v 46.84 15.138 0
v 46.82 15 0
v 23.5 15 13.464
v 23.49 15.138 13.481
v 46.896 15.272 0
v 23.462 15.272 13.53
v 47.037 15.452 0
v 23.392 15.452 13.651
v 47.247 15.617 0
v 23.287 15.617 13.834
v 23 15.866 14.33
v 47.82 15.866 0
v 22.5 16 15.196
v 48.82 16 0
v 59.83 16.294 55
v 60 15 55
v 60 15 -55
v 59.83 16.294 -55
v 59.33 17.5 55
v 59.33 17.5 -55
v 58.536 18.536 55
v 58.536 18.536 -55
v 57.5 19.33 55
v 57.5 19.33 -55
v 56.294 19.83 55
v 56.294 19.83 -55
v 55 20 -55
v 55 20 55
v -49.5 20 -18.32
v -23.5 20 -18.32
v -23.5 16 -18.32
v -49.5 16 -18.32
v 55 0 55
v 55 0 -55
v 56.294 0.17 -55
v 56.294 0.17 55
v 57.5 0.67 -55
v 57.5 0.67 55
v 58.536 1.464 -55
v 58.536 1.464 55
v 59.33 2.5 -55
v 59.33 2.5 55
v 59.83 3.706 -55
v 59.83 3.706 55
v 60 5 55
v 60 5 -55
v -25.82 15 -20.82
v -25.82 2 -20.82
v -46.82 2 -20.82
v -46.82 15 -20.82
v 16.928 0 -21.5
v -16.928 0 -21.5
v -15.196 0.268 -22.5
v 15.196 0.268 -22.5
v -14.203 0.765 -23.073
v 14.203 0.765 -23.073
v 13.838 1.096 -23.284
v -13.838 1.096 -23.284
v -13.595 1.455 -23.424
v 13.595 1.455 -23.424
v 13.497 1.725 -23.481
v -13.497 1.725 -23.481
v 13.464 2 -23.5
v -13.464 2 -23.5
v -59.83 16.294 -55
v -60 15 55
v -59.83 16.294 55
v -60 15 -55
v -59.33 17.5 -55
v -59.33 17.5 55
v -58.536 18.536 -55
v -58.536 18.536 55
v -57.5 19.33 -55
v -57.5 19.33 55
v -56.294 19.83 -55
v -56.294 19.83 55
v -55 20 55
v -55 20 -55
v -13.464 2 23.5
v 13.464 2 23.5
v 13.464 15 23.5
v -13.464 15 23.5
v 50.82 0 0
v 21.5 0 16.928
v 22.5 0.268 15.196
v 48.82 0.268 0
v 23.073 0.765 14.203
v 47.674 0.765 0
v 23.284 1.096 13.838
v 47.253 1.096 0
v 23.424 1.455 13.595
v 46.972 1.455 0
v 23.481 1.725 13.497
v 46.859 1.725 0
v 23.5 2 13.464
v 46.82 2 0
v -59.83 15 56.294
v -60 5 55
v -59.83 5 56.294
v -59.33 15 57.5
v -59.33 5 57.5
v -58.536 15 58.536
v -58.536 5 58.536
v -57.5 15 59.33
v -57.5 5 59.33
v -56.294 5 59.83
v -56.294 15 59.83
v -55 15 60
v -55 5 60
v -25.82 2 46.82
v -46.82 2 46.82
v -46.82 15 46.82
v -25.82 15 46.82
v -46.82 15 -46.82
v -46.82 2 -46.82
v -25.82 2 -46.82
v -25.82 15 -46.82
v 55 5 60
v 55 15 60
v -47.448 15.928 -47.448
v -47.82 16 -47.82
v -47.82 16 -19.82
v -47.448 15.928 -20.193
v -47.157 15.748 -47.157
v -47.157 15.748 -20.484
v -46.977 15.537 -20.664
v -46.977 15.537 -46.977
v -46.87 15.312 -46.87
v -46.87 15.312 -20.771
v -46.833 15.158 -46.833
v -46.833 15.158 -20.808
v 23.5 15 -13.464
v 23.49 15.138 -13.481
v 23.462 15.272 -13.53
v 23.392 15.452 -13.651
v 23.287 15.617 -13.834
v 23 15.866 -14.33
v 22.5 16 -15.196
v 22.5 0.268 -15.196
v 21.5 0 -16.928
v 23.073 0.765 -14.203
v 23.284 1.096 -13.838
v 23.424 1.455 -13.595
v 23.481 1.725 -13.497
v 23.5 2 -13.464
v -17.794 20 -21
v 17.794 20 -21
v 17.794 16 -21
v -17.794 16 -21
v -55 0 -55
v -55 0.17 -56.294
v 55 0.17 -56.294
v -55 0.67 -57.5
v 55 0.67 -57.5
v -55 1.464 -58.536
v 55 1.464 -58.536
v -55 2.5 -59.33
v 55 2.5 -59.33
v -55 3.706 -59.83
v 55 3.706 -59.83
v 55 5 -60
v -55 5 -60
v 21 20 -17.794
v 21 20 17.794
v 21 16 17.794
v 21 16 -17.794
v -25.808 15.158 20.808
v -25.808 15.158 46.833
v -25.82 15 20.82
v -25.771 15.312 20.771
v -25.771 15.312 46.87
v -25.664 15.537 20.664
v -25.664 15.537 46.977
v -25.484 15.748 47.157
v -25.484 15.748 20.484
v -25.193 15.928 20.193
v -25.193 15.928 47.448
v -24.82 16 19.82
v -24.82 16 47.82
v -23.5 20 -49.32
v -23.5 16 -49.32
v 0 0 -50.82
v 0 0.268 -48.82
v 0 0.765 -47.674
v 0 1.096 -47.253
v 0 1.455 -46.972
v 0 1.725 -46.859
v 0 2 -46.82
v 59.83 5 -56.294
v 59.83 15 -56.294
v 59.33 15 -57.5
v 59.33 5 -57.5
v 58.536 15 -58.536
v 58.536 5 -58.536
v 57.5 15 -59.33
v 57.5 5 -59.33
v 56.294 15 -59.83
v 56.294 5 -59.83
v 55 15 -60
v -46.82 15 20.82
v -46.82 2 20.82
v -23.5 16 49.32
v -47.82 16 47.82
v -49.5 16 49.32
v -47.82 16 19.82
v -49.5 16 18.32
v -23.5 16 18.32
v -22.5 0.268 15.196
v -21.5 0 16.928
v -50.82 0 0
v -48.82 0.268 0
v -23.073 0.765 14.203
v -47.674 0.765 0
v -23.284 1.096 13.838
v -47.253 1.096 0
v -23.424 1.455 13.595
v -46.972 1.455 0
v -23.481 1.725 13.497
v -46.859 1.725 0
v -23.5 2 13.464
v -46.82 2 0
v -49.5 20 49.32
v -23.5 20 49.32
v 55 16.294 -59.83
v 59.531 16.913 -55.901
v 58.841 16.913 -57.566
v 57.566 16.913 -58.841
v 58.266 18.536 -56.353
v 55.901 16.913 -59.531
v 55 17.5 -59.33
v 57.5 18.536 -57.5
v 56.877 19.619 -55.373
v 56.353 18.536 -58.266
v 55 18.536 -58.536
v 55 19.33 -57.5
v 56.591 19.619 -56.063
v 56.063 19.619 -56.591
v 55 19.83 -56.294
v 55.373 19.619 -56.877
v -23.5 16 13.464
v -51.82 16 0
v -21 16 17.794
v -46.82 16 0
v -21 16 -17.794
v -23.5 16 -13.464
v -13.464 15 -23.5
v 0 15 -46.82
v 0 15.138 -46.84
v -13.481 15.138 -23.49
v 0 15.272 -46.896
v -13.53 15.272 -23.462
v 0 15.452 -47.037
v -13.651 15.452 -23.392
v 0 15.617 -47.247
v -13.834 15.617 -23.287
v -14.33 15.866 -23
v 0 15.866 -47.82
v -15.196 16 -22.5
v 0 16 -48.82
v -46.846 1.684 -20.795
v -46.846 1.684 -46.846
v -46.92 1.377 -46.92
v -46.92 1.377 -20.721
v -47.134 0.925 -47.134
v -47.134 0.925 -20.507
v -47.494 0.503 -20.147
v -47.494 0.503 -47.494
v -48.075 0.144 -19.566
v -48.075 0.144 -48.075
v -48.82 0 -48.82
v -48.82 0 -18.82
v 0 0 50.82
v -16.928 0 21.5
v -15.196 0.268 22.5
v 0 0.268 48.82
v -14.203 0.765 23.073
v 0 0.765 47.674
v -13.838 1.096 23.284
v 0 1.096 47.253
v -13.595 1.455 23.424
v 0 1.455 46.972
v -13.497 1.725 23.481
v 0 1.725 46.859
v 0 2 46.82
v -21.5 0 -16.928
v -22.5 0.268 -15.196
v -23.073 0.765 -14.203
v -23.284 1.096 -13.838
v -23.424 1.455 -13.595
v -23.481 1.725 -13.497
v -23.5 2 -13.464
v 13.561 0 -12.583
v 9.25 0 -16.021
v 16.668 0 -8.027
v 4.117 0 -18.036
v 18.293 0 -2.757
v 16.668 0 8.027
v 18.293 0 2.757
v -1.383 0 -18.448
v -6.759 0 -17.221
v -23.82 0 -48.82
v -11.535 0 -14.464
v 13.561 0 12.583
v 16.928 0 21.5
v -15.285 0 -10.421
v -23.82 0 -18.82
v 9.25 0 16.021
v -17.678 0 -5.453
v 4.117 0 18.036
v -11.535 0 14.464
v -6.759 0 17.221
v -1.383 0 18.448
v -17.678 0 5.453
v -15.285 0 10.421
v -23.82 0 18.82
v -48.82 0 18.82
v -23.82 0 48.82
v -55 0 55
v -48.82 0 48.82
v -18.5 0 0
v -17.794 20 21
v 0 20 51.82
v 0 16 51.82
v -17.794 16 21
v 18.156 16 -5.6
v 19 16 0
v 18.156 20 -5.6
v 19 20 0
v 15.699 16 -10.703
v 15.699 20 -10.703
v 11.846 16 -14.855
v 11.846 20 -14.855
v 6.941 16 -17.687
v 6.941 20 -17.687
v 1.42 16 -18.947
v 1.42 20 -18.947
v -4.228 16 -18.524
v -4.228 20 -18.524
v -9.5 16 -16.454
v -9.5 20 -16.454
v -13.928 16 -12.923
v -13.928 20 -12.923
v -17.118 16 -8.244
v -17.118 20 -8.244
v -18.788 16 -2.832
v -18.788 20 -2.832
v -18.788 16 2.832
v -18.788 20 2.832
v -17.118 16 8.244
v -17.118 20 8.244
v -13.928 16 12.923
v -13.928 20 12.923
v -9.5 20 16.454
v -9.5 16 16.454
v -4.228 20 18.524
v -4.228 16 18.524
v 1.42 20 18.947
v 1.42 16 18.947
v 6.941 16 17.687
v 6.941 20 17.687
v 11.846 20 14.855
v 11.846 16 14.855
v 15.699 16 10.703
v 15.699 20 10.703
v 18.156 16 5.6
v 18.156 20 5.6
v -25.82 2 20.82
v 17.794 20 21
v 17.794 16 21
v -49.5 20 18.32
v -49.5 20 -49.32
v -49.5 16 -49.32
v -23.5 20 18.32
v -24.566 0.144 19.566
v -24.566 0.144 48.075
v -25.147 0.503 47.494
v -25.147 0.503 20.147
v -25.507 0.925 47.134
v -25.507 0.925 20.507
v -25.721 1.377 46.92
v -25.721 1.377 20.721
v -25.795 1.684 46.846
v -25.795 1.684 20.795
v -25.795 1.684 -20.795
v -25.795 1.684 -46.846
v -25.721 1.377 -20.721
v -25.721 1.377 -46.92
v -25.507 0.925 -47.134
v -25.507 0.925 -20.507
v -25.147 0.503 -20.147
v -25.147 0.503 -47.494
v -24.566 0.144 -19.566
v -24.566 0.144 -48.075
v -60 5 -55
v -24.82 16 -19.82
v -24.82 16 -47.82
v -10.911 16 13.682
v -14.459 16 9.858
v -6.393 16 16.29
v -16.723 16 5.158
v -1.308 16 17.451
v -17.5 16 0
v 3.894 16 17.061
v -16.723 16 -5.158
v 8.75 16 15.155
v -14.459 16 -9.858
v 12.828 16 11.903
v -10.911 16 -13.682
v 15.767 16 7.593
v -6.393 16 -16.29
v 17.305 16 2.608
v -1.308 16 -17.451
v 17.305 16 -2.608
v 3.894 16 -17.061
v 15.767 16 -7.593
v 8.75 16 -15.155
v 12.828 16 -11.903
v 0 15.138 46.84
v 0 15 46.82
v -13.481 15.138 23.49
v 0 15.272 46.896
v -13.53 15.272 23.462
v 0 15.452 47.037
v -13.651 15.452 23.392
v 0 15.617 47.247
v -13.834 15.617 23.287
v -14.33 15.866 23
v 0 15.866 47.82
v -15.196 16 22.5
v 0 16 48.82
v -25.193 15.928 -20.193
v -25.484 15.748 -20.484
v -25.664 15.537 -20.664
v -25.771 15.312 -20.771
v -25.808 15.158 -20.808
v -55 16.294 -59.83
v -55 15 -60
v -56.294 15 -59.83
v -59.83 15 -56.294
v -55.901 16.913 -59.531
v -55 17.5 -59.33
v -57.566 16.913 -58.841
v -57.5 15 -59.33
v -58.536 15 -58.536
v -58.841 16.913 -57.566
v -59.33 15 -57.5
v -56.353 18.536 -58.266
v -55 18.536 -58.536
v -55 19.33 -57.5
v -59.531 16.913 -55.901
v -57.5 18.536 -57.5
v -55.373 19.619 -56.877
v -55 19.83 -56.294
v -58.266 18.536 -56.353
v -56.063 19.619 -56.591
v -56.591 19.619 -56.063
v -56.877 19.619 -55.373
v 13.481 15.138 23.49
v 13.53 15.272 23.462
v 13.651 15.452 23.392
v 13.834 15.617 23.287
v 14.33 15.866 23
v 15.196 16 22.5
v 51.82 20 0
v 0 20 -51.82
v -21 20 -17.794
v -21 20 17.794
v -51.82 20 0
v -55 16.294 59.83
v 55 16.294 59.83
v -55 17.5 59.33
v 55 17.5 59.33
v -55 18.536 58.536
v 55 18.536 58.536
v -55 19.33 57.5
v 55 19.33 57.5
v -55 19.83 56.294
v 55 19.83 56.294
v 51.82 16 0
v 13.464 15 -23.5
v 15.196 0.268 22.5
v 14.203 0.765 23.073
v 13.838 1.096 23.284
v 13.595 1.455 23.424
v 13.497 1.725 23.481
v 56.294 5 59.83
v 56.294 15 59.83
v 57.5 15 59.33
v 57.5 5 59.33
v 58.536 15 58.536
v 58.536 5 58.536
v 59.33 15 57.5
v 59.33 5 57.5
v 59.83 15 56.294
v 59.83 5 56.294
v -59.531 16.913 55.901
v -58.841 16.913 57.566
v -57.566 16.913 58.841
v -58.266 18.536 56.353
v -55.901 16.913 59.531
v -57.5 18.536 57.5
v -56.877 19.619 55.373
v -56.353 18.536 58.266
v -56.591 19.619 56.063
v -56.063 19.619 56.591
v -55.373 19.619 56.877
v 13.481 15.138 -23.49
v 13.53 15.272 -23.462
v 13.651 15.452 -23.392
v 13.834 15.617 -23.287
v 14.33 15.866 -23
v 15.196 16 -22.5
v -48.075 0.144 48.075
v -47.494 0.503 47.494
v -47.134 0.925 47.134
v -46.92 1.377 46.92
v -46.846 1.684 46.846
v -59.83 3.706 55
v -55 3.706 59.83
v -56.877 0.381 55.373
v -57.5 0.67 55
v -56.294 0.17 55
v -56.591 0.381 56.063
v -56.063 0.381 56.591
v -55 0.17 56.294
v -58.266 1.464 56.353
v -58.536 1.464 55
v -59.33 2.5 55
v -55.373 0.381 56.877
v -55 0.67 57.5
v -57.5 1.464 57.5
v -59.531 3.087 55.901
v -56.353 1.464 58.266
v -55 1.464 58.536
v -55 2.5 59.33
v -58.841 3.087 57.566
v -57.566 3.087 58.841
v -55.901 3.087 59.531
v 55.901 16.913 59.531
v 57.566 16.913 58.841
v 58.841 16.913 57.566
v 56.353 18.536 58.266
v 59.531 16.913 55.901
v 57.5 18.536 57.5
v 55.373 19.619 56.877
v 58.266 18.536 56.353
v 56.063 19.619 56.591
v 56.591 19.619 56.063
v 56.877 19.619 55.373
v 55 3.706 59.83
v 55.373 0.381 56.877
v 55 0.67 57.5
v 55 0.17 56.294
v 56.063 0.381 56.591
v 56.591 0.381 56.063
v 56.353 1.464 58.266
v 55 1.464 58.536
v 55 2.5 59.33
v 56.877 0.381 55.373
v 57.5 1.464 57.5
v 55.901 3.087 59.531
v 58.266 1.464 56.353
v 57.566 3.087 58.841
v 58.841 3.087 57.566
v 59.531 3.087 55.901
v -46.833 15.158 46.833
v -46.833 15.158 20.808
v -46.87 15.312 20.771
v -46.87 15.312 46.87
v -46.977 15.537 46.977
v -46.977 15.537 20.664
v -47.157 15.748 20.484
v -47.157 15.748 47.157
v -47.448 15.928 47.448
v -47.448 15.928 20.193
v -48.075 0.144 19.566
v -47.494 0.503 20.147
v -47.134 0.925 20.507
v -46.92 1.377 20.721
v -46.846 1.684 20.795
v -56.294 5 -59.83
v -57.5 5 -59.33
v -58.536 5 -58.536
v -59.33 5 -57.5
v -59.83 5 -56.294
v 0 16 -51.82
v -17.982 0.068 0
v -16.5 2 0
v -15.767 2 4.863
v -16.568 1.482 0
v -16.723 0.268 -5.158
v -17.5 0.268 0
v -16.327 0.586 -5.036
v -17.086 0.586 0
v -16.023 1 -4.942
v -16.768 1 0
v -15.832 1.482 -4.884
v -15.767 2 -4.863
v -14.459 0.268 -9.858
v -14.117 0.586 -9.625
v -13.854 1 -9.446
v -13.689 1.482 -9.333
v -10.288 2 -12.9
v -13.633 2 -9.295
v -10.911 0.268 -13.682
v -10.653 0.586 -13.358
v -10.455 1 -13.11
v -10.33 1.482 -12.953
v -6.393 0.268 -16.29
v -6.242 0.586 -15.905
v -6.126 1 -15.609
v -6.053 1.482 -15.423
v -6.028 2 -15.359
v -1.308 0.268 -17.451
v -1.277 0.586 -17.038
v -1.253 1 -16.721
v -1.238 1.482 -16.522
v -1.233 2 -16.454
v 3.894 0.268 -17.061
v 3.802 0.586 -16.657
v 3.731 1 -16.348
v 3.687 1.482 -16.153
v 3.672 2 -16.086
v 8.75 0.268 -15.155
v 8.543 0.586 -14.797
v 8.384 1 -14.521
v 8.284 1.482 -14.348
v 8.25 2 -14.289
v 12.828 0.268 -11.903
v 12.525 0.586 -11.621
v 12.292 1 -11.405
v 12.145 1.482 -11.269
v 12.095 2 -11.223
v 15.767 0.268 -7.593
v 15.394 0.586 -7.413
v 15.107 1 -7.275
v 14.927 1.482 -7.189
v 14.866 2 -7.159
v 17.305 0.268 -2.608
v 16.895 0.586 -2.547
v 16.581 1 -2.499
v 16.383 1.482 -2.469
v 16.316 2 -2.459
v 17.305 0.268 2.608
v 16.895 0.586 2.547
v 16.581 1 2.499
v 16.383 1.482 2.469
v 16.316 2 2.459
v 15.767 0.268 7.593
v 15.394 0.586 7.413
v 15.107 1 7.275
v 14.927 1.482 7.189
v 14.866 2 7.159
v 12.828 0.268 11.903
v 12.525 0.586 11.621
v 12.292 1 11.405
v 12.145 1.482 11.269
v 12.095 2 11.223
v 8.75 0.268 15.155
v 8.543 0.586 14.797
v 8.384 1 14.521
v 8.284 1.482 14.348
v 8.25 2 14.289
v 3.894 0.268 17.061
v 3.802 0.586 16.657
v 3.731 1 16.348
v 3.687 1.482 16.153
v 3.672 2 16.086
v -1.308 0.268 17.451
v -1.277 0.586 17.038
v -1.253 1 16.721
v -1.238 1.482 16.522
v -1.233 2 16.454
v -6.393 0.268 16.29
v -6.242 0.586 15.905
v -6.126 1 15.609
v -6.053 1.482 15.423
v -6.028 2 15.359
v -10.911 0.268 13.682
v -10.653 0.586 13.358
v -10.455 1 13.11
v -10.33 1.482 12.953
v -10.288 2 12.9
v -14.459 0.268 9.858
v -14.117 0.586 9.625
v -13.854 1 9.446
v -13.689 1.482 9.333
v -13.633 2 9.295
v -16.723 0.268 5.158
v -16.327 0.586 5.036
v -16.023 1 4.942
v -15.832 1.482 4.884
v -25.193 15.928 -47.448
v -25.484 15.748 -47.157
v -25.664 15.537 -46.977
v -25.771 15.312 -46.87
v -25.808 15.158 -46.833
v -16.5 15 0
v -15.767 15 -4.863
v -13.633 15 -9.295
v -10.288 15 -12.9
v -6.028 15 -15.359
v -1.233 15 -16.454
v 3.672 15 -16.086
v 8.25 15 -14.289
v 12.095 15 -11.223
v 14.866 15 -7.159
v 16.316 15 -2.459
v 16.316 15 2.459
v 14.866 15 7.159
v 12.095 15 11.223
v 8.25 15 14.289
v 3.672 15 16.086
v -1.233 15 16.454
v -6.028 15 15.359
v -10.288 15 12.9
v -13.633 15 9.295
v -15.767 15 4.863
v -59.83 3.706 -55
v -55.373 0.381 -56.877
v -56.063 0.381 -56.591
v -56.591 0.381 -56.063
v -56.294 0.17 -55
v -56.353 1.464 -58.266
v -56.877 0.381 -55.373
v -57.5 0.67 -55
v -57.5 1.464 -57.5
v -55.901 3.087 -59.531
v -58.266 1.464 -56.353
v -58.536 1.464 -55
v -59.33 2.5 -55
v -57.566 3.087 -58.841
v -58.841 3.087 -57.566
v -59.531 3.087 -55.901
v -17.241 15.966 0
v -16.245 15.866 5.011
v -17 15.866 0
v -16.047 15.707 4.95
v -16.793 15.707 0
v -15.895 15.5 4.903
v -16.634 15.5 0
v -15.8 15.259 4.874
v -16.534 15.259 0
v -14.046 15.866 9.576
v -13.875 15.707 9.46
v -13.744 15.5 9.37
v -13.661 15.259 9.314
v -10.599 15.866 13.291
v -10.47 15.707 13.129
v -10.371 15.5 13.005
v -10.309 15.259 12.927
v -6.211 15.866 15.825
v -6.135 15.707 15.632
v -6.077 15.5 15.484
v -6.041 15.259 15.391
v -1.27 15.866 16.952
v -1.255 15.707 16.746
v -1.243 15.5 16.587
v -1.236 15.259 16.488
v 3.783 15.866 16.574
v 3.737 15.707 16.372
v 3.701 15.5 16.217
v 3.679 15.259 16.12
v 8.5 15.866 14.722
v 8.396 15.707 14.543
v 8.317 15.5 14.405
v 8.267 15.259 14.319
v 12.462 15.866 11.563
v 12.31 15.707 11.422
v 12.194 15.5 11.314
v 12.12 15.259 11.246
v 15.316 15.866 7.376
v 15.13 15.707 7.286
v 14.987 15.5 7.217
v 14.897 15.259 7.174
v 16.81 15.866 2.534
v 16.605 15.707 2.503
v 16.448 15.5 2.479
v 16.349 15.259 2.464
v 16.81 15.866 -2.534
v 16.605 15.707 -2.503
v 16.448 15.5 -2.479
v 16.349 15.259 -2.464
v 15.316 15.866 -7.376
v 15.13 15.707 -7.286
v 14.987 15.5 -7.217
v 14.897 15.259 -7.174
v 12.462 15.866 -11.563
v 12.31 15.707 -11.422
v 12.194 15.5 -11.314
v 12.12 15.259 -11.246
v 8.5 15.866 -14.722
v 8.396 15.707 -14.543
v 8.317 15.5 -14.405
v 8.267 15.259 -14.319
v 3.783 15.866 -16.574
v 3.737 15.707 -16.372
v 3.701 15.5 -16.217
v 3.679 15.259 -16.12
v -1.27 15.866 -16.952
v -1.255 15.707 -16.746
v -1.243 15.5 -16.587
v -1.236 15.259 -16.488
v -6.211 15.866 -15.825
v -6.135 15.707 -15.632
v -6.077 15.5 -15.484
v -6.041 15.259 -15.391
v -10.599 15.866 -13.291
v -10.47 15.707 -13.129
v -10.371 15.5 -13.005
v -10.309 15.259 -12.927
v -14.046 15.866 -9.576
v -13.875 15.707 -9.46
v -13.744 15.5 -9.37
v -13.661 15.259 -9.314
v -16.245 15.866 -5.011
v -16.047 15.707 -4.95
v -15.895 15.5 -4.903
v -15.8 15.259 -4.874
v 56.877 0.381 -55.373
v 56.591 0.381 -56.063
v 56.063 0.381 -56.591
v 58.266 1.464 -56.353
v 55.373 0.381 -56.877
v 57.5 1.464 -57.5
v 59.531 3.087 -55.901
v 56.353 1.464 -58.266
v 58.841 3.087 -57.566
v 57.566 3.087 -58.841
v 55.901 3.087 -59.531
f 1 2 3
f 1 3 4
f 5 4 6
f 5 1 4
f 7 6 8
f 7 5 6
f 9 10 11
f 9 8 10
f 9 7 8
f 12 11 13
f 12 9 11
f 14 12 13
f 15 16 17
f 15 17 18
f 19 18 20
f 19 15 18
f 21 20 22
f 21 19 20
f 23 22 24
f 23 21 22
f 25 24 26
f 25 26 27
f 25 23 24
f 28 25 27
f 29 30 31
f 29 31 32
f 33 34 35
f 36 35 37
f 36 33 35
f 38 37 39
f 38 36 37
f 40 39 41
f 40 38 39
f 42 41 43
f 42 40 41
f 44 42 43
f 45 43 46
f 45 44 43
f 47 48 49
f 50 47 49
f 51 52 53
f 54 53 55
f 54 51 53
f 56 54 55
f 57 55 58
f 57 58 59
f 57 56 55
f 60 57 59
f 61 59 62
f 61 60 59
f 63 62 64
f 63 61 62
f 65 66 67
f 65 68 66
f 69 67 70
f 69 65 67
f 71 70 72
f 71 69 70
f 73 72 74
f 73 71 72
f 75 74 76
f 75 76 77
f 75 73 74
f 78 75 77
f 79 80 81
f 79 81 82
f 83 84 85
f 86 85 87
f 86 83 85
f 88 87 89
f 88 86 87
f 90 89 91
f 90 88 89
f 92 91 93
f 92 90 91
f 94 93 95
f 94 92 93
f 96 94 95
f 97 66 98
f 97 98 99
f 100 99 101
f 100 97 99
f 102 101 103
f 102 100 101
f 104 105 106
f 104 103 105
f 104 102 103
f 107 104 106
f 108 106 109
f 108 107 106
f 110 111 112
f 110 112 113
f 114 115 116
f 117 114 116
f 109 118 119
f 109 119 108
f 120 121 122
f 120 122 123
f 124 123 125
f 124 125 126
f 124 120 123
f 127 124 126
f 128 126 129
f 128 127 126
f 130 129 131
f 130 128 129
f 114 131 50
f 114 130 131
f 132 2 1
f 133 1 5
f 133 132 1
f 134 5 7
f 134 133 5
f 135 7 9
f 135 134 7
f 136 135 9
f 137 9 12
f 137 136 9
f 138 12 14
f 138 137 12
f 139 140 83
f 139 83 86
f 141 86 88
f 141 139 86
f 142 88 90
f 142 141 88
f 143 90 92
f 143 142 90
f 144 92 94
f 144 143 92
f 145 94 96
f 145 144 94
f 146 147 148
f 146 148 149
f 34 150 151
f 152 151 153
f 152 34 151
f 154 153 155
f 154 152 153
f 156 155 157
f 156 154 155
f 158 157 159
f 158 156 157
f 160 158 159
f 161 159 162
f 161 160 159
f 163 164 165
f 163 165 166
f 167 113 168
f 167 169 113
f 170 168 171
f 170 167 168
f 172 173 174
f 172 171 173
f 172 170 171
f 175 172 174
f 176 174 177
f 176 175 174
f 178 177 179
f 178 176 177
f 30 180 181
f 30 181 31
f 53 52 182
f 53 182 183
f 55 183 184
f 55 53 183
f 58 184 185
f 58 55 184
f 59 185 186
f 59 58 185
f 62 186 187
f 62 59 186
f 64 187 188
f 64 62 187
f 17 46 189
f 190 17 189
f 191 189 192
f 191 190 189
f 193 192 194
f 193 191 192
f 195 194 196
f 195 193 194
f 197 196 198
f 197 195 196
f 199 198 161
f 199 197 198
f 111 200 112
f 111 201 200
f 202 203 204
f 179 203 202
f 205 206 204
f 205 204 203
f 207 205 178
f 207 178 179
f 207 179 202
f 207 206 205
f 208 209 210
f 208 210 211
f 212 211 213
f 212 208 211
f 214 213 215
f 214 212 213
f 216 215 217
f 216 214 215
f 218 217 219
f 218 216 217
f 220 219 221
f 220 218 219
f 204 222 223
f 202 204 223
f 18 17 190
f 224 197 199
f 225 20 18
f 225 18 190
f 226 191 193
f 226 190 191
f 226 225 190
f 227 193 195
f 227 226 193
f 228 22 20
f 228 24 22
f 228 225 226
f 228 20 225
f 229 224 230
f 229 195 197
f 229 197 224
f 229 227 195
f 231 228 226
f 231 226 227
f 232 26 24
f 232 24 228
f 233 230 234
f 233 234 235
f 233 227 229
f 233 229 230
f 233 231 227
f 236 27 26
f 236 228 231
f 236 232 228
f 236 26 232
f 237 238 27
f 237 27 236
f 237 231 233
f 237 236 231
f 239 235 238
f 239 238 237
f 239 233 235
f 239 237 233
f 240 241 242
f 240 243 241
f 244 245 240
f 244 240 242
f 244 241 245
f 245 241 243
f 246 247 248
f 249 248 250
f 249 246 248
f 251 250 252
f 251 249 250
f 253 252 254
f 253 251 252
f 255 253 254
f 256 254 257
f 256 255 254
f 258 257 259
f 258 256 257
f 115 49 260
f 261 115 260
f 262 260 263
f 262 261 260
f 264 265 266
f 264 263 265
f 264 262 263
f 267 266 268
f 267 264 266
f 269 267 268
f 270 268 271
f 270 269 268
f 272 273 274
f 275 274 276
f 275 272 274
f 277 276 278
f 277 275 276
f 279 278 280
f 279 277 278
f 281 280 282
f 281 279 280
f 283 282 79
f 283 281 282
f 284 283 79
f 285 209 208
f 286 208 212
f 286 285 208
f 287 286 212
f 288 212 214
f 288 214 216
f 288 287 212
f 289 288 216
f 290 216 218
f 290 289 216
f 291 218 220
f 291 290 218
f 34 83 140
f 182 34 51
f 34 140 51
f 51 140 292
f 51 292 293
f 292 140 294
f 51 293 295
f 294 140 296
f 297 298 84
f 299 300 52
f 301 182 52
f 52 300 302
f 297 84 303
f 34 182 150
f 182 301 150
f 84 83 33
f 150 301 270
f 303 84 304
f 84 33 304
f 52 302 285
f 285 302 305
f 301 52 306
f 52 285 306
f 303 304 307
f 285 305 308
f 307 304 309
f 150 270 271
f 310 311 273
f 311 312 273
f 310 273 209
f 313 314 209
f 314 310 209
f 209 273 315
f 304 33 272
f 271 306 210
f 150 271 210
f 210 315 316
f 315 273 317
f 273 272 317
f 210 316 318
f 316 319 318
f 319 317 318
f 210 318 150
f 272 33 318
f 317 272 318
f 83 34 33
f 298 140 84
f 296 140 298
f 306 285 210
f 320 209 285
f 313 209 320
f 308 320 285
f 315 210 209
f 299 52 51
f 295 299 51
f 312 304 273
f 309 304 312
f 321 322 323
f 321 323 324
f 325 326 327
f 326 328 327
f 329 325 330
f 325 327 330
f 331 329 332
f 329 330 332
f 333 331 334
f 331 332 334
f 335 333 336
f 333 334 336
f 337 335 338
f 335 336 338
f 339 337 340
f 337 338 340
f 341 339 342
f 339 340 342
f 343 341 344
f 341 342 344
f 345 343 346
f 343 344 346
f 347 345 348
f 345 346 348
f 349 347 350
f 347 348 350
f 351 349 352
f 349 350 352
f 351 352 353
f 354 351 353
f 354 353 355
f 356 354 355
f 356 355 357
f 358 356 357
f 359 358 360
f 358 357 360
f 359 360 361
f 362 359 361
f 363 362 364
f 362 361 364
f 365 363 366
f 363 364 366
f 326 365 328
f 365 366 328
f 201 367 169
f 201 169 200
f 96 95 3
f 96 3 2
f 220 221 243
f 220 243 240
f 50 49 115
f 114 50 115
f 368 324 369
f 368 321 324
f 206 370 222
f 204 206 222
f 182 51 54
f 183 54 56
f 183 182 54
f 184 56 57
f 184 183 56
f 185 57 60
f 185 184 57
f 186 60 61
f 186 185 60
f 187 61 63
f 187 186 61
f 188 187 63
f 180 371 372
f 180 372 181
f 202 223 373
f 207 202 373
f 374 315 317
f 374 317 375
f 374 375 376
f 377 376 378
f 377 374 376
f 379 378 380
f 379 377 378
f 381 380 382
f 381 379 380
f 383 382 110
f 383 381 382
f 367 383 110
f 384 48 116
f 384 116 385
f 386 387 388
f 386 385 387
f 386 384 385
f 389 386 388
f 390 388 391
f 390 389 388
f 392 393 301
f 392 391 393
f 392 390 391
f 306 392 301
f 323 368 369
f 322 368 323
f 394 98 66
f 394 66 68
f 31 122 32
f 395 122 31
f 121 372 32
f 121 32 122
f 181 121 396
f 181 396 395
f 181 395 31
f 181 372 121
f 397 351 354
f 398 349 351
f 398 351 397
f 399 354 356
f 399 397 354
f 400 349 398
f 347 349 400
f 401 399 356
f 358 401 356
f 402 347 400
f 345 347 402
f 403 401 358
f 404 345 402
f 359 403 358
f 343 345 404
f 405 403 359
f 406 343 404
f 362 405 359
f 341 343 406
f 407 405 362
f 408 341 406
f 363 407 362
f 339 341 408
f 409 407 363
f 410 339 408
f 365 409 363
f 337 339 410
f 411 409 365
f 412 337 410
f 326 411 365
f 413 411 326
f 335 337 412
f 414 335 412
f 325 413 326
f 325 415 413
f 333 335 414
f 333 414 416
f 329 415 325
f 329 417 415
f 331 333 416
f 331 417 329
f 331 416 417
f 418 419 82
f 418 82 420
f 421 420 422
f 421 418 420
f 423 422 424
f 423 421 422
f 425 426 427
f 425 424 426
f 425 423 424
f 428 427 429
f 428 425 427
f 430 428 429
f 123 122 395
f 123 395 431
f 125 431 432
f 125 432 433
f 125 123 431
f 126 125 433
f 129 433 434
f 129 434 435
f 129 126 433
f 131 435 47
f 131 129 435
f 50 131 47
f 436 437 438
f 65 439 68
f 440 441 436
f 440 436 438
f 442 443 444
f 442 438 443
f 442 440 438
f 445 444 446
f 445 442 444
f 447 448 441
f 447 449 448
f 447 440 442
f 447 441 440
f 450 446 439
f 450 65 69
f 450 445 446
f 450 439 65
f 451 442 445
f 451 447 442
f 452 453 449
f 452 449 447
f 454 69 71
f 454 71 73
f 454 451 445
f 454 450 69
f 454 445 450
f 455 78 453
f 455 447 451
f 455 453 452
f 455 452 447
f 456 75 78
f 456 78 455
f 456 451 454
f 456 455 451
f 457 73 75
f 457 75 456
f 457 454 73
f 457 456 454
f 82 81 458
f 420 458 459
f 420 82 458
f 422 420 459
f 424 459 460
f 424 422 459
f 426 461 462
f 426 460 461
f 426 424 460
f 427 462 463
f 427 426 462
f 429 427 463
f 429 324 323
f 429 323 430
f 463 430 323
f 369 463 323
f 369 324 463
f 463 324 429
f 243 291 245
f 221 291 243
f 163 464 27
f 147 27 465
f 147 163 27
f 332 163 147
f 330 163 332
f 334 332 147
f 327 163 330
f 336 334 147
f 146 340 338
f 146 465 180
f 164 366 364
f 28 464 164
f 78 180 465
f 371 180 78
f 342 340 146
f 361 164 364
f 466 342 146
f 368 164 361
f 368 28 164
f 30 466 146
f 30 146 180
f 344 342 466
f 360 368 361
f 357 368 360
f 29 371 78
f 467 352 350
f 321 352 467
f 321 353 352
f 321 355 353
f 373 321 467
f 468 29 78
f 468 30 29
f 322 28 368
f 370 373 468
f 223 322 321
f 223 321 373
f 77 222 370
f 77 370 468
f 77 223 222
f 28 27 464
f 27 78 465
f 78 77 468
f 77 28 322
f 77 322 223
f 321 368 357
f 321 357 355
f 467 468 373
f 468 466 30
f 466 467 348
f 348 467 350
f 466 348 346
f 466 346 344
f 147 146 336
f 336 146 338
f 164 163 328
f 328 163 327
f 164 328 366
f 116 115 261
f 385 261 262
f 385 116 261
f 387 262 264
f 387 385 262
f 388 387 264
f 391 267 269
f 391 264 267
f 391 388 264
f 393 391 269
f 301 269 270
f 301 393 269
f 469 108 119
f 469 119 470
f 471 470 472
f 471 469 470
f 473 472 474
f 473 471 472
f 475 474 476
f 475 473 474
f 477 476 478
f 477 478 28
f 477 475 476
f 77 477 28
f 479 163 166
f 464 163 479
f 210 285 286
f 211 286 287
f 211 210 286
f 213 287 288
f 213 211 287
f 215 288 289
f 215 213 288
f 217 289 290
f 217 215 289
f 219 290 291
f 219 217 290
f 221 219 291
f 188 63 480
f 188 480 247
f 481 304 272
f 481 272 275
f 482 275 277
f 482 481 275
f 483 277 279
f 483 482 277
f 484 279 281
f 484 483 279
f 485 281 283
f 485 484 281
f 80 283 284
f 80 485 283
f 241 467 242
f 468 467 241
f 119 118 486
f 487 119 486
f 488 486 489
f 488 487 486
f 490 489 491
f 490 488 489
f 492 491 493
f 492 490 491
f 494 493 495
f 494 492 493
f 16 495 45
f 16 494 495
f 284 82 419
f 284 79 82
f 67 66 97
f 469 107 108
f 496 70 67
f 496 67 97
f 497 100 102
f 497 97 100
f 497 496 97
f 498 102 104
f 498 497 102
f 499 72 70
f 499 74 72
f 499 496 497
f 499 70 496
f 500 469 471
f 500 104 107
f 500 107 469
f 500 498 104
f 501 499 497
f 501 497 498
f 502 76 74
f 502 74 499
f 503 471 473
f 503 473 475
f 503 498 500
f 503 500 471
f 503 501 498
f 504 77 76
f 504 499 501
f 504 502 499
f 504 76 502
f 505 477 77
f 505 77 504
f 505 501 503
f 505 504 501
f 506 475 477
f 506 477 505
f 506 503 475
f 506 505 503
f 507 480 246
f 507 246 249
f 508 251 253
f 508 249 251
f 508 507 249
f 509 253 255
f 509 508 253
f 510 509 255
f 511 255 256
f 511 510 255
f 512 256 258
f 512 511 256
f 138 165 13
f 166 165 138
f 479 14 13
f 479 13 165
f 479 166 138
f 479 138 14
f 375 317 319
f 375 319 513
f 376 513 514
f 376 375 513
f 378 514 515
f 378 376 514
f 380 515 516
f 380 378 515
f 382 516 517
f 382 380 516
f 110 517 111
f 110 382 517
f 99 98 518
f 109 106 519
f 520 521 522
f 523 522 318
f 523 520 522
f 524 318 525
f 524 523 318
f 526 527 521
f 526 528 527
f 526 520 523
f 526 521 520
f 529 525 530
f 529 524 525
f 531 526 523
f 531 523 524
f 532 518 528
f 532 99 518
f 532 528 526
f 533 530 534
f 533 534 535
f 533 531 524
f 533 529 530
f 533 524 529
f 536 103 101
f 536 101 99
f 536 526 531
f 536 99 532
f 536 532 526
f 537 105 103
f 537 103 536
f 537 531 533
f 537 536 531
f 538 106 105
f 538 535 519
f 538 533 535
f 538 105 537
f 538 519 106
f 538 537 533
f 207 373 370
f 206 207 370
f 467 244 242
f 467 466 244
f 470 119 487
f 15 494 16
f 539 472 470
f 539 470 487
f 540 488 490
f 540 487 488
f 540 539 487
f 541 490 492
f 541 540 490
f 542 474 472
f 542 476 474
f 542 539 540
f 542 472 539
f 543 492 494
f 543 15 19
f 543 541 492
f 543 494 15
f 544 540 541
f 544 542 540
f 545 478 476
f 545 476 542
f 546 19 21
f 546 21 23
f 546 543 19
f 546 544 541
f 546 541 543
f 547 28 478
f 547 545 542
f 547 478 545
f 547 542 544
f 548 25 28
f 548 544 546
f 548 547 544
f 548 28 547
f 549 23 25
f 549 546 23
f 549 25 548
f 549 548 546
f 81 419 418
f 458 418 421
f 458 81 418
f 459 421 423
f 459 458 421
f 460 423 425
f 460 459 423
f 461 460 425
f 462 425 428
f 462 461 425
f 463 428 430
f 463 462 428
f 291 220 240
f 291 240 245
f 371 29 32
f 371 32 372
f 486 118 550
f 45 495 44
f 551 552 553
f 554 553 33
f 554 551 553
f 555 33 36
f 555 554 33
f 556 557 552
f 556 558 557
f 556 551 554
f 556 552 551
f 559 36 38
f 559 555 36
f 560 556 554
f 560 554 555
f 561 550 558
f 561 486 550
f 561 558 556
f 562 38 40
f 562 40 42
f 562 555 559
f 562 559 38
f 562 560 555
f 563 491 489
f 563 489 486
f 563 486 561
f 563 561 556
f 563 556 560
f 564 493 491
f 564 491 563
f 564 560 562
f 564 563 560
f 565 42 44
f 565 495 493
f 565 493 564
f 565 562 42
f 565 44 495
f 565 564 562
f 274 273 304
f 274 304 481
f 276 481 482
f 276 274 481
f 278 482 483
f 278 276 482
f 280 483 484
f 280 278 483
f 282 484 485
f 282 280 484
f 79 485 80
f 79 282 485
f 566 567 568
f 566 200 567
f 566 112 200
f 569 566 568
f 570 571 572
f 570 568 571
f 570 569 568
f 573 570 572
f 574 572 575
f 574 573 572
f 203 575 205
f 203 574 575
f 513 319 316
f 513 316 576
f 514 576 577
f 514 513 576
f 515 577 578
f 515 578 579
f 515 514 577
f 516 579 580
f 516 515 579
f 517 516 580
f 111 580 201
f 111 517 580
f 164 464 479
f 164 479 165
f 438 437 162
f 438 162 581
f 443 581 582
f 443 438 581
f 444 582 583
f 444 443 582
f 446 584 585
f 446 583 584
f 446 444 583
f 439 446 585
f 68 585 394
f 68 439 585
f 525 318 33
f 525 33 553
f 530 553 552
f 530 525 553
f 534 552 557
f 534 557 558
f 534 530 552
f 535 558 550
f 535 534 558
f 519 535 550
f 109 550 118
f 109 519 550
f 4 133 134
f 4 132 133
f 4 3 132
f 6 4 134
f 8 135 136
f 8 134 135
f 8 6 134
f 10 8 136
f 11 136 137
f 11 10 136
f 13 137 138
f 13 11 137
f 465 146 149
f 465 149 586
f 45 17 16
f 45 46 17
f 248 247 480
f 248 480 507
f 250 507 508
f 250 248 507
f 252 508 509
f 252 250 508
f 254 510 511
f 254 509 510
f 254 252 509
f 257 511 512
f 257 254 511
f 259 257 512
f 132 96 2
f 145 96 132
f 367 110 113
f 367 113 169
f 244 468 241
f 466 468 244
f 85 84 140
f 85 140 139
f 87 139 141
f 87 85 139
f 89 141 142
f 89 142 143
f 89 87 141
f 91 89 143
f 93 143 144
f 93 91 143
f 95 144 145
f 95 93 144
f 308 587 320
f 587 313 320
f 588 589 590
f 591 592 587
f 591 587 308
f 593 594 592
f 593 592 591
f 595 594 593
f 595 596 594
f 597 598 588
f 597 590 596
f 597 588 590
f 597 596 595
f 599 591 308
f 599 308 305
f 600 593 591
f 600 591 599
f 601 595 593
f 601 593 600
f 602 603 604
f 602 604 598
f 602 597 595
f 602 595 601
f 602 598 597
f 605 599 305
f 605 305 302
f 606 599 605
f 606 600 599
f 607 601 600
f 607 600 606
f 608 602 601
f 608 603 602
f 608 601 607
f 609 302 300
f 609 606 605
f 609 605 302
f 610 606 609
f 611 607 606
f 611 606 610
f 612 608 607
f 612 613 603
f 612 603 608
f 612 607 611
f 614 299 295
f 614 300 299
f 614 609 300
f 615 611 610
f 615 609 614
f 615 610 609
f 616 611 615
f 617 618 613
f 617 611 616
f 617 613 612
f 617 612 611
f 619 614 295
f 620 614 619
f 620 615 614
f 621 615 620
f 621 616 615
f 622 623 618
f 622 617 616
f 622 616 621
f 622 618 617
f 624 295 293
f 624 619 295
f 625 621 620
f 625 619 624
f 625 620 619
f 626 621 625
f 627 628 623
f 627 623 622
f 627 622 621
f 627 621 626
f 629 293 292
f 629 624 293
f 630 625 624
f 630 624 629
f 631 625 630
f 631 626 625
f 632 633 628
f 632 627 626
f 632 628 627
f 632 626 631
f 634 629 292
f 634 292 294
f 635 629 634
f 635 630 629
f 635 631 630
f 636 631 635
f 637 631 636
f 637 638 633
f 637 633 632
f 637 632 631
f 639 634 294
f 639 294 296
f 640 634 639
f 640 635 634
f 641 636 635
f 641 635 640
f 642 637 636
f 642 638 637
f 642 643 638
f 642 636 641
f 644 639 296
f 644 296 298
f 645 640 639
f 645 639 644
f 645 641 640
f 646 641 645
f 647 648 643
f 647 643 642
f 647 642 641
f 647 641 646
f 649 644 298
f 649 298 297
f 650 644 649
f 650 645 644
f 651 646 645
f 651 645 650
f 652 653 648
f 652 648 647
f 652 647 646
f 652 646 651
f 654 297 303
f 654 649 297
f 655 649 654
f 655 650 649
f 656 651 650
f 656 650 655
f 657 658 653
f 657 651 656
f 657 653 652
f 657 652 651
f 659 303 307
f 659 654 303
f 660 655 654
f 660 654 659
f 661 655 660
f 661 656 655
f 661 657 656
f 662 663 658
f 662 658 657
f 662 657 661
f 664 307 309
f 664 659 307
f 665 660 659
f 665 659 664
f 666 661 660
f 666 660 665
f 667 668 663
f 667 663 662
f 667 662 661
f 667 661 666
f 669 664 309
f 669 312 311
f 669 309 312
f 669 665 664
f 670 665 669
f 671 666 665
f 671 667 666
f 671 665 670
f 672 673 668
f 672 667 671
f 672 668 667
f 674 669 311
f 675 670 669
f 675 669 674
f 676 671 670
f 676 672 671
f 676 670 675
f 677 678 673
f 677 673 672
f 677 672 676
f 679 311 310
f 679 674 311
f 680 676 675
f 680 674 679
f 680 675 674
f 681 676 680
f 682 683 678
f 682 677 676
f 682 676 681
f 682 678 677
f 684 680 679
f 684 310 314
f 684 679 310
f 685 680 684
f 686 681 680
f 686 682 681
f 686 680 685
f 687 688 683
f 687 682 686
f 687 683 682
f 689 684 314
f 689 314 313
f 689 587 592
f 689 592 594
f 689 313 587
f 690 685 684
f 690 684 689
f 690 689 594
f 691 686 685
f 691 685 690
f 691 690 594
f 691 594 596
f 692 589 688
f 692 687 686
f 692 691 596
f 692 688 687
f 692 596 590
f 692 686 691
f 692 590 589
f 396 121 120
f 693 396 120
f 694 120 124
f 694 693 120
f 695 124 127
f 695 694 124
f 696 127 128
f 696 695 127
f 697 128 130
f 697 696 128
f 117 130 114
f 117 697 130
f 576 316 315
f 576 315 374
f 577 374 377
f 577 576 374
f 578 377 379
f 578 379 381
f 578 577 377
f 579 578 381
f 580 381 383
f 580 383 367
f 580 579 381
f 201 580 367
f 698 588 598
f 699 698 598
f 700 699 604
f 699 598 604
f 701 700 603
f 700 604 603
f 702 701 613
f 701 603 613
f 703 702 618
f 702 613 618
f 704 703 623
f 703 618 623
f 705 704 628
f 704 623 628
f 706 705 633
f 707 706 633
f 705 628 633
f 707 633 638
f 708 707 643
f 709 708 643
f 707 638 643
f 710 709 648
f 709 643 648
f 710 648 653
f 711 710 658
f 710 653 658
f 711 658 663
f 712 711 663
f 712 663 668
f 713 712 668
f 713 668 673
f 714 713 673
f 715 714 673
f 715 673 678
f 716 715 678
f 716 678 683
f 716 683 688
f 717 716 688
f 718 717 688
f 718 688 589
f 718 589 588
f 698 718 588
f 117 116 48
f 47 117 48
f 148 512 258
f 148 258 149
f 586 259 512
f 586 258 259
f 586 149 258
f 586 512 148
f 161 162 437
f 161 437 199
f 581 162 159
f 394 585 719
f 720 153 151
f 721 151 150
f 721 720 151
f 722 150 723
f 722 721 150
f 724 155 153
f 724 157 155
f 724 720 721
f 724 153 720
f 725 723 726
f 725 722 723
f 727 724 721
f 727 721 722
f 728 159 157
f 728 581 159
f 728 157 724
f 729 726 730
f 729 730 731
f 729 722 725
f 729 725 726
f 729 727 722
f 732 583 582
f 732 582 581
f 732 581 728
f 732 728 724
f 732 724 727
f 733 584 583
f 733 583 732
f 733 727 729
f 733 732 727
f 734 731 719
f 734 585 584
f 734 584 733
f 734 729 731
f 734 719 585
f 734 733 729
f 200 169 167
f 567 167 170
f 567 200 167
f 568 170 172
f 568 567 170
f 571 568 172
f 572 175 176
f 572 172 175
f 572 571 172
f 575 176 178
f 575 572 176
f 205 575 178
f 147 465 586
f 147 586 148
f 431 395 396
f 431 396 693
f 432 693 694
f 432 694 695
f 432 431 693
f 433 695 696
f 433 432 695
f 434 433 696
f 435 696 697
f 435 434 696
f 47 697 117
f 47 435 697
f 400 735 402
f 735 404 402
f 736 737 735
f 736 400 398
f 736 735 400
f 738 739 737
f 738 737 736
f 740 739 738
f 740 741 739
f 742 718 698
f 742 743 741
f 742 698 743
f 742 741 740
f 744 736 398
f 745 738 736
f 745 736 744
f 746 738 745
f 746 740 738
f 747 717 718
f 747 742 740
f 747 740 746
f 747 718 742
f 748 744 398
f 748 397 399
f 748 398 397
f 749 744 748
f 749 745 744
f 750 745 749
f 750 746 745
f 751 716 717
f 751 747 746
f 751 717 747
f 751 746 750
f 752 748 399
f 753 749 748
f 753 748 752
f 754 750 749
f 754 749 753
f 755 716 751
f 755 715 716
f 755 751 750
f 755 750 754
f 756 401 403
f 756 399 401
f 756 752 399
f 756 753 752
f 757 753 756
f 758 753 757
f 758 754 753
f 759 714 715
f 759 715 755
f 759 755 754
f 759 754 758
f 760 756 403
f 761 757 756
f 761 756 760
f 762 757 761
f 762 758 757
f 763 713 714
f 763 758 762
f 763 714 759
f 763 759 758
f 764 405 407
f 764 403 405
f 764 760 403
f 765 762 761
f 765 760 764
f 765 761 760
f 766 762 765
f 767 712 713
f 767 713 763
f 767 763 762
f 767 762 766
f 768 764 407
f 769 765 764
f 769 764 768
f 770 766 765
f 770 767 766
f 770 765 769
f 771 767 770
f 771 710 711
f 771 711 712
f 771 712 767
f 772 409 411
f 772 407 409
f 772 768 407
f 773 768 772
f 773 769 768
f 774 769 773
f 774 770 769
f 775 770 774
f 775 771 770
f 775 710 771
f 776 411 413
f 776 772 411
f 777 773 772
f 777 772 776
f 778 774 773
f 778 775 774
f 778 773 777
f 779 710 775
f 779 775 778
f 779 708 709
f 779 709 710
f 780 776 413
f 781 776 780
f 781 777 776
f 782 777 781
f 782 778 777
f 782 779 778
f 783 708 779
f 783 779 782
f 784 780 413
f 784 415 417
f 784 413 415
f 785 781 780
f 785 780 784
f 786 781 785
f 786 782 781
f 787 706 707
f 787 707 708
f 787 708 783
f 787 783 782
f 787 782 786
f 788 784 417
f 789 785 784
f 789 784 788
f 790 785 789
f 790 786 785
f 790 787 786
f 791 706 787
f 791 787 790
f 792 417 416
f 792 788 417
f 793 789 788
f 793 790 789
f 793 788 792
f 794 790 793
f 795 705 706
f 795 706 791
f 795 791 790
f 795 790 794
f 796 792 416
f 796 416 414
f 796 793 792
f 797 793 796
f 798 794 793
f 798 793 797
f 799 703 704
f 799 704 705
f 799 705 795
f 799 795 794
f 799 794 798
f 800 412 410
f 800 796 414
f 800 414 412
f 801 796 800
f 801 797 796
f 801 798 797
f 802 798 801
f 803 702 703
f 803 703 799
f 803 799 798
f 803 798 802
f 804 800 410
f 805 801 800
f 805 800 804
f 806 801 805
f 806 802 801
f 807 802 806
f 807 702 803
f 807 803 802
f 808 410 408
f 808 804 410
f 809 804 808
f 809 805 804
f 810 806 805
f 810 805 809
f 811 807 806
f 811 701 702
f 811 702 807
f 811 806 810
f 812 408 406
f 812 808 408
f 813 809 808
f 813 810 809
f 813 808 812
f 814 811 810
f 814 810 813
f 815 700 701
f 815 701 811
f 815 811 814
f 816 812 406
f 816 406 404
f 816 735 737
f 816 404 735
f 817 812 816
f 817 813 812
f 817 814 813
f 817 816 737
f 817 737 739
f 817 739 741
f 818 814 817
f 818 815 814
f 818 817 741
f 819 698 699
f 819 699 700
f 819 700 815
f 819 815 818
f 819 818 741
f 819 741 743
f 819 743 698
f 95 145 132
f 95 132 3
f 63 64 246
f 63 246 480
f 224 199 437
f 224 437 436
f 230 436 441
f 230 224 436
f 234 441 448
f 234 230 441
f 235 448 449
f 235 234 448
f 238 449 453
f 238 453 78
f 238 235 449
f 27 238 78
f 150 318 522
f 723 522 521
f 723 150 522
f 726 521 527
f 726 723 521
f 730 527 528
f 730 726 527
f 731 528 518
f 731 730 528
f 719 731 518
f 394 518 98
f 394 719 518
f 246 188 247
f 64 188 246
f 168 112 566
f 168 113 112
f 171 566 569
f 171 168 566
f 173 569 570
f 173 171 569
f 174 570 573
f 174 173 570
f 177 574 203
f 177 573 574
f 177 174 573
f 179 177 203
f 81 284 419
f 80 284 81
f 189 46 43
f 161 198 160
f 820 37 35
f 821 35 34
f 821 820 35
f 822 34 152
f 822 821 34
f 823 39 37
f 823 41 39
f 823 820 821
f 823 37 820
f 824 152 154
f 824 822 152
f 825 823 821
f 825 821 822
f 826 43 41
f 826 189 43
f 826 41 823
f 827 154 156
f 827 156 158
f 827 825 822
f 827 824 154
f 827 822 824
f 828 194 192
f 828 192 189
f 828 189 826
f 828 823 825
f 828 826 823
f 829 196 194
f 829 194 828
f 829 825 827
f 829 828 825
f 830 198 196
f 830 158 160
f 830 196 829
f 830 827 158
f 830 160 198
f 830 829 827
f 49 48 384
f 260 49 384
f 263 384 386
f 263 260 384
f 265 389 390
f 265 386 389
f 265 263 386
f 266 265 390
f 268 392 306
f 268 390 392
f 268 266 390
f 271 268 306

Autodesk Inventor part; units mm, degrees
ref_plane "YZ Plane" through (0, 0, 0) normal (1, 0, 0) x (0, 1, 0)
ref_plane "XZ Plane" through (0, 0, 0) normal (0, 1, 0) x (-1, 0, 0)
ref_plane "XY Plane" through (0, 0, 0) normal (0, 0, 1) x (1, 0, 0)
sketch "Sketch1" plane through (0, 0, 0) normal (0, 1, 0) x (-1, 0, 0)
  circle A0 centre (0, 0) radius 15
  line L0 (0, -25) -> (10.866, -25)
  line L1 (0, -25) -> (-10.866, -25)
  line L2 (-10.866, -25) -> (0, -43.8205)
  line L3 (0, -43.8205) -> (10.866, -25)
  circle A1 centre (0, 0) radius 16.5
  line L4 (13.4641, -23.5) -> (0, -23.5)
  line L5 (0, -23.5) -> (-13.4641, -23.5)
  line L6 (-13.4641, -23.5) -> (0, -46.8205)
  line L7 (0, -46.8205) -> (13.4641, -23.5)
  line L8 (25, 0) -> (25, 10.866)
  line L9 (25, 0) -> (25, -10.866)
  line L10 (25, -10.866) -> (43.8205, 0)
  line L11 (43.8205, 0) -> (25, 10.866)
  line L12 (23.5, 13.4641) -> (23.5, 0)
  line L13 (23.5, 0) -> (23.5, -13.4641)
  line L14 (23.5, -13.4641) -> (46.8205, 0)
  line L15 (46.8205, 0) -> (23.5, 13.4641)
  line L16 (0, 25) -> (-10.866, 25)
  line L17 (0, 25) -> (10.866, 25)
  line L18 (10.866, 25) -> (0, 43.8205)
  line L19 (0, 43.8205) -> (-10.866, 25)
  line L20 (-13.4641, 23.5) -> (0, 23.5)
  line L21 (0, 23.5) -> (13.4641, 23.5)
  line L22 (13.4641, 23.5) -> (0, 46.8205)
  line L23 (0, 46.8205) -> (-13.4641, 23.5)
  line L24 (-25, 0) -> (-25, -10.866)
  line L25 (-25, 0) -> (-25, 10.866)
  line L26 (-25, 10.866) -> (-43.8205, 0)
  line L27 (-43.8205, 0) -> (-25, -10.866)
  line L28 (-23.5, -13.4641) -> (-23.5, 0)
  line L29 (-23.5, 0) -> (-23.5, 13.4641)
  line L30 (-23.5, 13.4641) -> (-46.8205, 0)
  line L31 (-46.8205, 0) -> (-23.5, -13.4641)
  line L32 (46.8205, 46.8205) -> (25.8205, 46.8205)
  line L33 (25.8205, 46.8205) -> (25.8205, 20.8205)
  line L34 (25.8205, 20.8205) -> (46.8205, 20.8205)
  line L35 (46.8205, 20.8205) -> (46.8205, 46.8205)
  line L36 (46.8205, -46.8205) -> (25.8205, -46.8205)
  line L37 (25.8205, -46.8205) -> (25.8205, -20.8205)
  line L38 (25.8205, -20.8205) -> (46.8205, -20.8205)
  line L39 (46.8205, -20.8205) -> (46.8205, -46.8205)
  line L40 (27.3205, 22.3205) -> (27.3205, 45.3205)
  line L41 (27.3205, 45.3205) -> (45.3205, 45.3205)
  line L42 (45.3205, 45.3205) -> (45.3205, 22.3205)
  line L43 (45.3205, 22.3205) -> (27.3205, 22.3205)
  line L44 (45.3205, -45.3205) -> (27.3205, -45.3205)
  line L45 (27.3205, -45.3205) -> (27.3205, -22.3205)
  line L46 (27.3205, -22.3205) -> (45.3205, -22.3205)
  line L47 (45.3205, -22.3205) -> (45.3205, -45.3205)
  line L48 (0, 60) -> (60, 60)
  line L49 (60, 60) -> (60, -60)
  line L50 (60, -60) -> (-60, -60)
  line L51 (-60, -60) -> (-60, 60)
  line L52 (-60, 60) -> (0, 60)
  dimension "d0" = 30
  dimension "d5" = 33
  dimension "d6" = 1.5
  dimension "d10" = 360
  dimension "d12" = 21
  dimension "d13" = 26
  dimension "d14" = 21
  dimension "d15" = 26
  dimension "d16" = 1.5
  dimension "d17" = 1.5
  dimension "d18" = 60
  dimension "d19" = 120
  dimension "d20" = 120
  dimension "d21" = 120
extrude "Extrusion1" add sketch "Sketch1" along normal blind 20 contours L48 L49 L50 L51 L52
sketch "Sketch2" plane through (0, 20, 0) normal (0, 1, 0) x (1, 0, 0)
  line L0 (-49.5, -21) -> (-49.5, -49.3205)
  line L1 (-49.5, -49.3205) -> (-23.5, -49.3205)
  line L2 (-23.5, -49.3205) -> (-23.5, -18.3205)
  line L3 (-23.5, -18.3205) -> (-49.5, -18.3205)
  line L4 (-49.5, -18.3205) -> (-49.5, -49.3205)
  line L5 (-49.5, 21) -> (-49.5, 49.3205)
  line L6 (-49.5, 49.3205) -> (-23.5, 49.3205)
  line L7 (-23.5, 49.3205) -> (-23.5, 18.3205)
  line L8 (-23.5, 18.3205) -> (-49.5, 18.3205)
  line L9 (-49.5, 18.3205) -> (-49.5, 49.3205)
  line L10 (-21, 0) -> (-21, 17.7942)
  line L11 (-51.8205, 0) -> (-21, 17.7942)
  line L12 (-21, -17.7942) -> (-51.8205, 0)
  line L13 (-21, 0) -> (-21, -17.7942)
  line L14 (0, -21) -> (-17.7942, -21)
  line L15 (0, -51.8205) -> (-17.7942, -21)
  line L16 (17.7942, -21) -> (0, -51.8205)
  line L17 (0, -21) -> (17.7942, -21)
  line L18 (21, 0) -> (21, -17.7942)
  line L19 (51.8205, 0) -> (21, -17.7942)
  line L20 (21, 17.7942) -> (51.8205, 0)
  line L21 (21, 0) -> (21, 17.7942)
  line L22 (0, 21) -> (17.7942, 21)
  line L23 (0, 51.8205) -> (17.7942, 21)
  line L24 (-17.7942, 21) -> (0, 51.8205)
  line L25 (0, 21) -> (-17.7942, 21)
  circle A0 centre (0, 0) radius 19
  point P0 (-25.8205, -46.8205)
  point P1 (-25.8205, 46.8205)
  dimension "d34" = 360
extrude "Extrusion2" cut sketch "Sketch2" against normal blind 4
fillet "Fillet1" radius 5 4 edges at (-60, 10, -60) (60, 10, -60) (60, 10, 60) (-60, 10, 60)
fillet "Fillet2" radius 5 8 edges at (-58.5355, 0, 58.5355) (-60, 0, 0) (-58.5355, 0, -58.5355) (0, 0, -60) (58.5355, 0, -58.5355) (60, 0, 0) (58.5355, 0, 58.5355) (0, 0, 60)
fillet "Fillet3" radius 2 21 edges at (-35.1603, 0, 6.7321) (-35.1603, 0, -6.7321) (-23.5, 0, 0) (-25.8205, 0, -33.8205) (-36.3205, 0, -20.8205) (-46.8205, 0, -33.8205) (-36.3205, 0, -46.8205) (6.7321, 0, -35.1603) (-6.7321, 0, -35.1603) (0, 0, -23.5) (35.1603, 0, -6.7321) (23.5, 0, 0) (35.1603, 0, 6.7321) (16.5, 0, 0) (0, 0, 23.5) (6.7321, 0, 35.1603) (-6.7321, 0, 35.1603) (-25.8205, 0, 33.8205) (-36.3205, 0, 20.8205) (-46.8205, 0, 33.8205) (-36.3205, 0, 46.8205)
fillet "Fillet4" radius 5 8 edges at (-58.5355, 20, 58.5355) (0, 20, 60) (58.5355, 20, 58.5355) (60, 20, 0) (58.5355, 20, -58.5355) (0, 20, -60) (-58.5355, 20, -58.5355) (-60, 20, 0)
fillet "Fillet5" radius 1 18 edges at (16.5, 16, 0) (-25.8205, 16, 33.8205) (-36.3205, 16, 46.8205) (-46.8205, 16, 33.8205) (-36.3205, 16, 20.8205) (-36.3205, 16, -20.8205) (-46.8205, 16, -33.8205) (-25.8205, 16, -33.8205) (-36.3205, 16, -46.8205) (0, 16, -23.5) (-6.7321, 16, -35.1603) (6.7321, 16, -35.1603) (6.7321, 16, 35.1603) (-6.7321, 16, 35.1603) (0, 16, 23.5) (35.1603, 16, 6.7321) (23.5, 16, 0) (35.1603, 16, -6.7321)
properties part number "Vo_Nut_Bam" material "Water"
